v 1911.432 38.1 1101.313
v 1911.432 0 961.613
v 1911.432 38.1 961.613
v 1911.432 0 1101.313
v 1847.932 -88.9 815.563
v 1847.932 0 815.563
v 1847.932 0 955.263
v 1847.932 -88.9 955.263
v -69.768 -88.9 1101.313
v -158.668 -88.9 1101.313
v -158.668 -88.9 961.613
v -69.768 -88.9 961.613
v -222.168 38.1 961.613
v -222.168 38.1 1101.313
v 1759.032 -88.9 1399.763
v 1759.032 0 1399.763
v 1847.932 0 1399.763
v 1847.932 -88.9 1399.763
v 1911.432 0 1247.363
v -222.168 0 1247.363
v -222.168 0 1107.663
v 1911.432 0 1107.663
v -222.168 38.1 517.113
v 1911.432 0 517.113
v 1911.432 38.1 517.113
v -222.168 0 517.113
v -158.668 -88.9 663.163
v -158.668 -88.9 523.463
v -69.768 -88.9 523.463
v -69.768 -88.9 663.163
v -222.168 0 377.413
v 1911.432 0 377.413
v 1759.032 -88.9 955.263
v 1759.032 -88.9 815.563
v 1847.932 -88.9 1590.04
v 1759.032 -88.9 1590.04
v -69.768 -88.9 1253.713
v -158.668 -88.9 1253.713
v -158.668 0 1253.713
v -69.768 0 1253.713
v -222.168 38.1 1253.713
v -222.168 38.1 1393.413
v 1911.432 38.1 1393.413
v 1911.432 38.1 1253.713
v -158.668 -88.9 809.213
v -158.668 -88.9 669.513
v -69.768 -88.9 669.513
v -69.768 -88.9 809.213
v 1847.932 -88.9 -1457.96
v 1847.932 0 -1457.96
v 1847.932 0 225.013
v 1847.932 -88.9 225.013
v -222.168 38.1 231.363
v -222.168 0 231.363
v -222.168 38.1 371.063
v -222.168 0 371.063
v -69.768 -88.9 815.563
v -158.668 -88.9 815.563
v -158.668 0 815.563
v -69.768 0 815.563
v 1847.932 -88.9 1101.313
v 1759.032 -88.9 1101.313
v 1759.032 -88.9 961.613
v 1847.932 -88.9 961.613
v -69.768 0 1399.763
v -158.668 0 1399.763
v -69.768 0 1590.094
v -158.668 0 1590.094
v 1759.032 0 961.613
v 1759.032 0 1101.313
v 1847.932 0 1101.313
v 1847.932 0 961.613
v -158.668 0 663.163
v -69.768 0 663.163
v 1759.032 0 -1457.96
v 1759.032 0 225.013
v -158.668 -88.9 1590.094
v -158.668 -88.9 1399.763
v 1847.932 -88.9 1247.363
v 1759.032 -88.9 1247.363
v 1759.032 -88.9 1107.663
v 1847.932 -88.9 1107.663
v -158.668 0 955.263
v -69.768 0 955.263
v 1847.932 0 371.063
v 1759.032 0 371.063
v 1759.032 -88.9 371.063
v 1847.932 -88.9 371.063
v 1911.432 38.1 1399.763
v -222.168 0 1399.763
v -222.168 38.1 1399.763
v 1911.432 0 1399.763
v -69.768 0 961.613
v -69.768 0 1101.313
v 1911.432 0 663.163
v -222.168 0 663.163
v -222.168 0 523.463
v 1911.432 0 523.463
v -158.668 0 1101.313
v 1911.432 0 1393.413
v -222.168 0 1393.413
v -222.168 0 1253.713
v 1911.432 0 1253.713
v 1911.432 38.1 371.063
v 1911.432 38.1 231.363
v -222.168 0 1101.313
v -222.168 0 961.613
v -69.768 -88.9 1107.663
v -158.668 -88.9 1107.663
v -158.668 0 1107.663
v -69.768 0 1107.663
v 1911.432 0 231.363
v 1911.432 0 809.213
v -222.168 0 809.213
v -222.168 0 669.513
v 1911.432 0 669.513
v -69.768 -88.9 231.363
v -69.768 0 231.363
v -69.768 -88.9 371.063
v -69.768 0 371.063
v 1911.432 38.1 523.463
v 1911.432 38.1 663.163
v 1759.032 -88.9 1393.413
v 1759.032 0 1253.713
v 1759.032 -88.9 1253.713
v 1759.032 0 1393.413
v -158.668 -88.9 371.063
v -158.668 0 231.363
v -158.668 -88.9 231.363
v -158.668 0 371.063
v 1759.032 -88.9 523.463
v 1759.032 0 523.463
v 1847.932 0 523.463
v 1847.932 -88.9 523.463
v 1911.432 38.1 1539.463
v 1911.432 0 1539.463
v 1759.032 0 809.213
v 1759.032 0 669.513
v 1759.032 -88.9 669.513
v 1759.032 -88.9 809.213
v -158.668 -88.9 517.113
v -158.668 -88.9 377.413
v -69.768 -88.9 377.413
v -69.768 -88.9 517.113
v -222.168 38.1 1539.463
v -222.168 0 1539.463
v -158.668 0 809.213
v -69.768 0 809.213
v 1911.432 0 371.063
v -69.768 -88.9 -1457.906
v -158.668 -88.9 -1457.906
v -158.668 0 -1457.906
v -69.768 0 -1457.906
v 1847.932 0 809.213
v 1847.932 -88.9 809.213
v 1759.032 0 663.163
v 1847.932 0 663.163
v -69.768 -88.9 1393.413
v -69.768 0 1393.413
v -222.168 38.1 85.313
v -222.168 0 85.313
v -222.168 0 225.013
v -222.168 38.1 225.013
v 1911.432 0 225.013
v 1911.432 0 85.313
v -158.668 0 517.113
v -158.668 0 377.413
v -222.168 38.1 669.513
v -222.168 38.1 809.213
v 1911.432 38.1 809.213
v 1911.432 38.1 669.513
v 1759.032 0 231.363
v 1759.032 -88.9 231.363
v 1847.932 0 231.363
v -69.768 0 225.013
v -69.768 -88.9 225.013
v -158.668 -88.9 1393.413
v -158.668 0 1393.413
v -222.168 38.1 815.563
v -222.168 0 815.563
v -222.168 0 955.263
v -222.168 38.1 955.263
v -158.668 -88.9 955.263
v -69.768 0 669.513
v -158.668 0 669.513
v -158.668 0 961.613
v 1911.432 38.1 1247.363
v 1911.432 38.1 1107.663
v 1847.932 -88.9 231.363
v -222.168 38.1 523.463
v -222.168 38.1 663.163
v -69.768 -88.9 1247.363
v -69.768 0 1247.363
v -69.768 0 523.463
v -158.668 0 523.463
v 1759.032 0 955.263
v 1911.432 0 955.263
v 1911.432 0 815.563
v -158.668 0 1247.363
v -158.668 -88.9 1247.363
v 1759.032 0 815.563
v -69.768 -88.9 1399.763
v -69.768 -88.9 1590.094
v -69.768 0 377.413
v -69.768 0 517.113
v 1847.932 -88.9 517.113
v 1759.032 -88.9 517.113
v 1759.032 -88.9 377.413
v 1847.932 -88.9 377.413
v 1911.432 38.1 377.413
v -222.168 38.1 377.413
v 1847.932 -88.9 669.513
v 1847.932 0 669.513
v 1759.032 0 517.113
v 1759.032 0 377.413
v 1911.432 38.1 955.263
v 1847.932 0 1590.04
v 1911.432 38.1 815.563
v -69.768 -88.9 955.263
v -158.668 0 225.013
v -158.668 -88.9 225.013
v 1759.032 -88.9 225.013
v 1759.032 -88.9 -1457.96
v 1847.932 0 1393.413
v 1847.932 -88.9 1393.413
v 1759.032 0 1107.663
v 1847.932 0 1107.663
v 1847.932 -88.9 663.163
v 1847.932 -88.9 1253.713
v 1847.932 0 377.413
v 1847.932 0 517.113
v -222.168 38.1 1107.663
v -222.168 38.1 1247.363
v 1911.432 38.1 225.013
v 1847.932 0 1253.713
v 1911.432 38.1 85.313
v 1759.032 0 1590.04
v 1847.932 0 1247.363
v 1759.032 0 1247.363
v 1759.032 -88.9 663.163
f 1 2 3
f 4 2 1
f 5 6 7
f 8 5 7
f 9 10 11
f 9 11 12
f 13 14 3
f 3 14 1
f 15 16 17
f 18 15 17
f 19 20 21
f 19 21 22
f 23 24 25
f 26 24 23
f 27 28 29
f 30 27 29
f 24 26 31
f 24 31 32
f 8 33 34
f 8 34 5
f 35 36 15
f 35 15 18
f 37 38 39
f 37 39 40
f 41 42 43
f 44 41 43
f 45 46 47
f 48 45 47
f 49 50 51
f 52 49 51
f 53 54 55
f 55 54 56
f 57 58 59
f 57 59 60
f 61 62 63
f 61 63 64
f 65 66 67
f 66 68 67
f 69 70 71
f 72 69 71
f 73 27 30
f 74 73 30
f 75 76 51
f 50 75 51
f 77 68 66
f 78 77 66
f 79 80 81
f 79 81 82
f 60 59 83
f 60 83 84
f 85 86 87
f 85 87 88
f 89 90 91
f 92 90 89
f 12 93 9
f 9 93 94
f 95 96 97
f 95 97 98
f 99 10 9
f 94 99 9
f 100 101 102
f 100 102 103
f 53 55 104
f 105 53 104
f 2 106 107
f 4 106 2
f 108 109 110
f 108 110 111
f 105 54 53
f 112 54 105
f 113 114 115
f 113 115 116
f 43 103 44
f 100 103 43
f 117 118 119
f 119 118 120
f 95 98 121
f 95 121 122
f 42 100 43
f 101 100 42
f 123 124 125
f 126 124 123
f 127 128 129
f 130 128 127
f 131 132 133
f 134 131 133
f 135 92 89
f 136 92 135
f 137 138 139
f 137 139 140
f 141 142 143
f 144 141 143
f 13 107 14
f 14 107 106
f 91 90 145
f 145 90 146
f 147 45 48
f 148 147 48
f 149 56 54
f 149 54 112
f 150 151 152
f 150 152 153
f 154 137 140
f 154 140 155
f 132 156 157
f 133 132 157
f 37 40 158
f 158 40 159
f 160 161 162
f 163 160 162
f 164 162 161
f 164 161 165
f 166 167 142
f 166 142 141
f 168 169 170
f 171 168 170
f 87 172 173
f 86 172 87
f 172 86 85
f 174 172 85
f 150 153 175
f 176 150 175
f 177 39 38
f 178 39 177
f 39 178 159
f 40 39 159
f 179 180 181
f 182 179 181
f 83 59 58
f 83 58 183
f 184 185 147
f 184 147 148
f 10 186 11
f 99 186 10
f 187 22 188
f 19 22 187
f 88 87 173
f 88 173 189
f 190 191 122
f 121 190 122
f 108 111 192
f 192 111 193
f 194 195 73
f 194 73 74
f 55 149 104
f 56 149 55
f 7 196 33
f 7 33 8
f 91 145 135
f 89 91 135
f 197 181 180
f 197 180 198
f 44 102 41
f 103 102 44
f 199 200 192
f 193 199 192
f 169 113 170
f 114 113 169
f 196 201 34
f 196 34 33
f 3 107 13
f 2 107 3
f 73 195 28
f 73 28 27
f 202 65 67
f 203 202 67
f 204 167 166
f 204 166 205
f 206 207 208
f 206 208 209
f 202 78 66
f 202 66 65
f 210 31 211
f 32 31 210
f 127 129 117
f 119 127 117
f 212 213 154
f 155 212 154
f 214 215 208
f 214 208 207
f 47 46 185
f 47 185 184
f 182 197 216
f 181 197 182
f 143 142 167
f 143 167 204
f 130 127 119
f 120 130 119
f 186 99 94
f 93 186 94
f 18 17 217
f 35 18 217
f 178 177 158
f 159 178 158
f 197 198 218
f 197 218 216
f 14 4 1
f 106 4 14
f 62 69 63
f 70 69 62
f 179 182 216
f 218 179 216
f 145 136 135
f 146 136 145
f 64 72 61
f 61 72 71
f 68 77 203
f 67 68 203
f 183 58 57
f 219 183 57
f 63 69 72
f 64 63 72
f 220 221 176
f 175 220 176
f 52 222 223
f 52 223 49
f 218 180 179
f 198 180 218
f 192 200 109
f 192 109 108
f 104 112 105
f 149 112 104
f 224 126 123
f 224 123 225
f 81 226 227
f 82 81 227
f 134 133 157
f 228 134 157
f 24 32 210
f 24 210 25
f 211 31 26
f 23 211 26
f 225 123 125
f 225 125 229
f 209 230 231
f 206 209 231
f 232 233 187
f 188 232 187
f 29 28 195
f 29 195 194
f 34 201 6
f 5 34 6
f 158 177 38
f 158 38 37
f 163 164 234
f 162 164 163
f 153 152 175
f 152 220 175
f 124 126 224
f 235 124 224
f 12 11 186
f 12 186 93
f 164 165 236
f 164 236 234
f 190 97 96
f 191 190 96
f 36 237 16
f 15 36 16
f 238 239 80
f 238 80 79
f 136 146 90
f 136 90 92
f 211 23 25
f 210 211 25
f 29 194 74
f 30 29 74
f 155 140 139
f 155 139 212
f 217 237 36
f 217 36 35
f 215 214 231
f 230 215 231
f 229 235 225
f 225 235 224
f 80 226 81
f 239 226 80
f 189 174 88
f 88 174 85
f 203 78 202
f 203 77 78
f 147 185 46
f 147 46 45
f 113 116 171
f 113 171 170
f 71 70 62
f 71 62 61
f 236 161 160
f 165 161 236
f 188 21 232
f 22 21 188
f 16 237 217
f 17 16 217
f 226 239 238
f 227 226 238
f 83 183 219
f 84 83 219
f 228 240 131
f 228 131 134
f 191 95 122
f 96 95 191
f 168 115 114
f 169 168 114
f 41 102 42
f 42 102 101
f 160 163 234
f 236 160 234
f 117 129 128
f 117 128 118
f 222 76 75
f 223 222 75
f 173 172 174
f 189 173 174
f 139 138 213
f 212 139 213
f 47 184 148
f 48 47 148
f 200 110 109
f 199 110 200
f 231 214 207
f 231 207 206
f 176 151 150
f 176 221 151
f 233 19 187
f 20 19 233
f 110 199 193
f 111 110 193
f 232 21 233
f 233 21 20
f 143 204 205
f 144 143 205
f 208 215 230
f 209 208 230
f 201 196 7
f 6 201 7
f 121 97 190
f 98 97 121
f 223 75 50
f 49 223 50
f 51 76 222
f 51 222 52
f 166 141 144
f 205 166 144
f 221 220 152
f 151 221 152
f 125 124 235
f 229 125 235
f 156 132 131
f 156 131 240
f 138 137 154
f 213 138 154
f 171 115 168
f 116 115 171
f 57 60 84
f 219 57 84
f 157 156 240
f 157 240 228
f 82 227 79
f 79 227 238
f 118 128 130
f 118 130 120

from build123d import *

# Parameters (mm, degrees)
F0_W     = 88.9
F0_H     = 914.4
F0_H_2   = 628.8184409082
F0_H_3   = 139.7
F1_DEPTH = 88.9
F0_H_4   = 50.6315590918
F0_H_5   = 50.5771776319
F0_H_6   = 914.45438146
F0_W_2   = 63.5
F0_W_3   = 1828.8
F2_DEPTH = 38.1


with BuildPart() as f1:
    # F0 (on Front) → F1 (new body)
    with BuildSketch(Plane.XZ):
        with Locations((-114.2183623821, -1000.705572027)):
            Rectangle(F0_W, F0_H)
        with Locations((-114.2183623821, -229.0963515729)):
            Rectangle(F0_W, F0_H_2)
        with Locations((-114.2183623821, 155.1628688812)):
            Rectangle(F0_W, F0_H_3)
    extrude(amount=F1_DEPTH)


with BuildPart() as f1b:
    # F0 (on Front) → F1, piece 2 (new body)
    with BuildSketch(Plane.XZ):
        with Locations((-114.2183623821, 301.2128688812)):
            Rectangle(F0_W, F0_H_3)
    extrude(amount=F1_DEPTH)


with BuildPart() as f1c:
    # F0 (on Front) → F1, piece 3 (new body)
    with BuildSketch(Plane.XZ):
        with Locations((-114.2183623821, 447.2628688812)):
            Rectangle(F0_W, F0_H_3)
    extrude(amount=F1_DEPTH)


with BuildPart() as f1d:
    # F0 (on Front) → F1, piece 4 (new body)
    with BuildSketch(Plane.XZ):
        with Locations((-114.2183623821, 593.3128688812)):
            Rectangle(F0_W, F0_H_3)
    extrude(amount=F1_DEPTH)


with BuildPart() as f1e:
    # F0 (on Front) → F1, piece 5 (new body)
    with BuildSketch(Plane.XZ):
        with Locations((-114.2183623821, 739.3628688812)):
            Rectangle(F0_W, F0_H_3)
    extrude(amount=F1_DEPTH)


with BuildPart() as f1f:
    # F0 (on Front) → F1, piece 6 (new body)
    with BuildSketch(Plane.XZ):
        with Locations((-114.2183623821, 885.4128688812)):
            Rectangle(F0_W, F0_H_3)
    extrude(amount=F1_DEPTH)


with BuildPart() as f1g:
    # F0 (on Front) → F1, piece 7 (new body)
    with BuildSketch(Plane.XZ):
        with Locations((-114.2183623821, 1031.4628688812)):
            Rectangle(F0_W, F0_H_3)
    extrude(amount=F1_DEPTH)


with BuildPart() as f1h:
    # F0 (on Front) → F1, piece 8 (new body)
    with BuildSketch(Plane.XZ):
        with Locations((-114.2183623821, 1177.5128688812)):
            Rectangle(F0_W, F0_H_3)
    extrude(amount=F1_DEPTH)


with BuildPart() as f1i:
    # F0 (on Front) → F1, piece 9 (new body)
    with BuildSketch(Plane.XZ):
        with Locations((-114.2183623821, 1323.5628688812)):
            Rectangle(F0_W, F0_H_3)
    extrude(amount=F1_DEPTH)


with BuildPart() as f1j:
    # F0 (on Front) → F1, piece 10 (new body)
    with BuildSketch(Plane.XZ):
        with Locations((-114.2183623821, 1469.6128688812)):
            Rectangle(F0_W, F0_H_3)
        with Locations((-114.2183623821, 1564.7786484271)):
            Rectangle(F0_W, F0_H_4)
    extrude(amount=F1_DEPTH)


with BuildPart() as f1k:
    # F0 (on Front) → F1, piece 11 (new body)
    with BuildSketch(Plane.XZ):
        with Locations((1803.4816376179, 1564.7514576972)):
            Rectangle(F0_W, F0_H_5)
        with Locations((1803.4816376179, 1469.6128688812)):
            Rectangle(F0_W, F0_H_3)
    extrude(amount=F1_DEPTH)


with BuildPart() as f1l:
    # F0 (on Front) → F1, piece 12 (new body)
    with BuildSketch(Plane.XZ):
        with Locations((1803.4816376179, 1323.5628688812)):
            Rectangle(F0_W, F0_H_3)
    extrude(amount=F1_DEPTH)


with BuildPart() as f1m:
    # F0 (on Front) → F1, piece 13 (new body)
    with BuildSketch(Plane.XZ):
        with Locations((1803.4816376179, 1177.5128688812)):
            Rectangle(F0_W, F0_H_3)
    extrude(amount=F1_DEPTH)


with BuildPart() as f1n:
    # F0 (on Front) → F1, piece 14 (new body)
    with BuildSketch(Plane.XZ):
        with Locations((1803.4816376179, 1031.4628688812)):
            Rectangle(F0_W, F0_H_3)
    extrude(amount=F1_DEPTH)


with BuildPart() as f1o:
    # F0 (on Front) → F1, piece 15 (new body)
    with BuildSketch(Plane.XZ):
        with Locations((1803.4816376179, 885.4128688812)):
            Rectangle(F0_W, F0_H_3)
    extrude(amount=F1_DEPTH)


with BuildPart() as f1p:
    # F0 (on Front) → F1, piece 16 (new body)
    with BuildSketch(Plane.XZ):
        with Locations((1803.4816376179, 739.3628688812)):
            Rectangle(F0_W, F0_H_3)
    extrude(amount=F1_DEPTH)


with BuildPart() as f1q:
    # F0 (on Front) → F1, piece 17 (new body)
    with BuildSketch(Plane.XZ):
        with Locations((1803.4816376179, 593.3128688812)):
            Rectangle(F0_W, F0_H_3)
    extrude(amount=F1_DEPTH)


with BuildPart() as f1r:
    # F0 (on Front) → F1, piece 18 (new body)
    with BuildSketch(Plane.XZ):
        with Locations((1803.4816376179, 447.2628688812)):
            Rectangle(F0_W, F0_H_3)
    extrude(amount=F1_DEPTH)


with BuildPart() as f1s:
    # F0 (on Front) → F1, piece 19 (new body)
    with BuildSketch(Plane.XZ):
        with Locations((1803.4816376179, 301.2128688812)):
            Rectangle(F0_W, F0_H_3)
    extrude(amount=F1_DEPTH)


with BuildPart() as f1t:
    # F0 (on Front) → F1, piece 20 (new body)
    with BuildSketch(Plane.XZ):
        with Locations((1803.4816376179, 155.1628688812)):
            Rectangle(F0_W, F0_H_3)
        with Locations((1803.4816376179, -229.0963515729)):
            Rectangle(F0_W, F0_H_2)
        with Locations((1803.4816376179, -1000.7327627569)):
            Rectangle(F0_W, F0_H_6)
    extrude(amount=F1_DEPTH)


with BuildPart() as f2:
    # F0 (on Front) → F2 (new body)
    with BuildSketch(Plane.XZ):
        with Locations((-190.4183623821, 1469.6128688812)):
            Rectangle(F0_W_2, F0_H_3)
        with Locations((844.6316376179, 1469.6128688812)):
            Rectangle(F0_W_3, F0_H_3)
        with Locations((-114.2183623821, 1469.6128688812)):
            Rectangle(F0_W, F0_H_3)
        with Locations((1803.4816376179, 1469.6128688812)):
            Rectangle(F0_W, F0_H_3)
        with Locations((1879.6816376179, 1469.6128688812)):
            Rectangle(F0_W_2, F0_H_3)
    extrude(amount=-F2_DEPTH)


with BuildPart() as f2b:
    # F0 (on Front) → F2, piece 2 (new body)
    with BuildSketch(Plane.XZ):
        with Locations((-190.4183623821, 1323.5628688812)):
            Rectangle(F0_W_2, F0_H_3)
        with Locations((-114.2183623821, 1323.5628688812)):
            Rectangle(F0_W, F0_H_3)
        with Locations((844.6316376179, 1323.5628688812)):
            Rectangle(F0_W_3, F0_H_3)
        with Locations((1803.4816376179, 1323.5628688812)):
            Rectangle(F0_W, F0_H_3)
        with Locations((1879.6816376179, 1323.5628688812)):
            Rectangle(F0_W_2, F0_H_3)
    extrude(amount=-F2_DEPTH)


with BuildPart() as f2c:
    # F0 (on Front) → F2, piece 3 (new body)
    with BuildSketch(Plane.XZ):
        with Locations((-190.4183623821, 1177.5128688812)):
            Rectangle(F0_W_2, F0_H_3)
        with Locations((-114.2183623821, 1177.5128688812)):
            Rectangle(F0_W, F0_H_3)
        with Locations((844.6316376179, 1177.5128688812)):
            Rectangle(F0_W_3, F0_H_3)
        with Locations((1803.4816376179, 1177.5128688812)):
            Rectangle(F0_W, F0_H_3)
        with Locations((1879.6816376179, 1177.5128688812)):
            Rectangle(F0_W_2, F0_H_3)
    extrude(amount=-F2_DEPTH)


with BuildPart() as f2d:
    # F0 (on Front) → F2, piece 4 (new body)
    with BuildSketch(Plane.XZ):
        with Locations((-190.4183623821, 1031.4628688812)):
            Rectangle(F0_W_2, F0_H_3)
        with Locations((-114.2183623821, 1031.4628688812)):
            Rectangle(F0_W, F0_H_3)
        with Locations((844.6316376179, 1031.4628688812)):
            Rectangle(F0_W_3, F0_H_3)
        with Locations((1803.4816376179, 1031.4628688812)):
            Rectangle(F0_W, F0_H_3)
        with Locations((1879.6816376179, 1031.4628688812)):
            Rectangle(F0_W_2, F0_H_3)
    extrude(amount=-F2_DEPTH)


with BuildPart() as f2e:
    # F0 (on Front) → F2, piece 5 (new body)
    with BuildSketch(Plane.XZ):
        with Locations((-190.4183623821, 885.4128688812)):
            Rectangle(F0_W_2, F0_H_3)
        with Locations((-114.2183623821, 885.4128688812)):
            Rectangle(F0_W, F0_H_3)
        with Locations((844.6316376179, 885.4128688812)):
            Rectangle(F0_W_3, F0_H_3)
        with Locations((1803.4816376179, 885.4128688812)):
            Rectangle(F0_W, F0_H_3)
        with Locations((1879.6816376179, 885.4128688812)):
            Rectangle(F0_W_2, F0_H_3)
    extrude(amount=-F2_DEPTH)


with BuildPart() as f2f:
    # F0 (on Front) → F2, piece 6 (new body)
    with BuildSketch(Plane.XZ):
        with Locations((-190.4183623821, 739.3628688812)):
            Rectangle(F0_W_2, F0_H_3)
        with Locations((-114.2183623821, 739.3628688812)):
            Rectangle(F0_W, F0_H_3)
        with Locations((844.6316376179, 739.3628688812)):
            Rectangle(F0_W_3, F0_H_3)
        with Locations((1803.4816376179, 739.3628688812)):
            Rectangle(F0_W, F0_H_3)
        with Locations((1879.6816376179, 739.3628688812)):
            Rectangle(F0_W_2, F0_H_3)
    extrude(amount=-F2_DEPTH)


with BuildPart() as f2g:
    # F0 (on Front) → F2, piece 7 (new body)
    with BuildSketch(Plane.XZ):
        with Locations((-190.4183623821, 593.3128688812)):
            Rectangle(F0_W_2, F0_H_3)
        with Locations((844.6316376179, 593.3128688812)):
            Rectangle(F0_W_3, F0_H_3)
        with Locations((-114.2183623821, 593.3128688812)):
            Rectangle(F0_W, F0_H_3)
        with Locations((1803.4816376179, 593.3128688812)):
            Rectangle(F0_W, F0_H_3)
        with Locations((1879.6816376179, 593.3128688812)):
            Rectangle(F0_W_2, F0_H_3)
    extrude(amount=-F2_DEPTH)


with BuildPart() as f2h:
    # F0 (on Front) → F2, piece 8 (new body)
    with BuildSketch(Plane.XZ):
        with Locations((-190.4183623821, 447.2628688812)):
            Rectangle(F0_W_2, F0_H_3)
        with Locations((-114.2183623821, 447.2628688812)):
            Rectangle(F0_W, F0_H_3)
        with Locations((844.6316376179, 447.2628688812)):
            Rectangle(F0_W_3, F0_H_3)
        with Locations((1803.4816376179, 447.2628688812)):
            Rectangle(F0_W, F0_H_3)
        with Locations((1879.6816376179, 447.2628688812)):
            Rectangle(F0_W_2, F0_H_3)
    extrude(amount=-F2_DEPTH)


with BuildPart() as f2i:
    # F0 (on Front) → F2, piece 9 (new body)
    with BuildSketch(Plane.XZ):
        with Locations((-190.4183623821, 301.2128688812)):
            Rectangle(F0_W_2, F0_H_3)
        with Locations((-114.2183623821, 301.2128688812)):
            Rectangle(F0_W, F0_H_3)
        with Locations((844.6316376179, 301.2128688812)):
            Rectangle(F0_W_3, F0_H_3)
        with Locations((1803.4816376179, 301.2128688812)):
            Rectangle(F0_W, F0_H_3)
        with Locations((1879.6816376179, 301.2128688812)):
            Rectangle(F0_W_2, F0_H_3)
    extrude(amount=-F2_DEPTH)


with BuildPart() as f2j:
    # F0 (on Front) → F2, piece 10 (new body)
    with BuildSketch(Plane.XZ):
        with Locations((-190.4183623821, 155.1628688812)):
            Rectangle(F0_W_2, F0_H_3)
        with Locations((-114.2183623821, 155.1628688812)):
            Rectangle(F0_W, F0_H_3)
        with Locations((844.6316376179, 155.1628688812)):
            Rectangle(F0_W_3, F0_H_3)
        with Locations((1803.4816376179, 155.1628688812)):
            Rectangle(F0_W, F0_H_3)
        with Locations((1879.6816376179, 155.1628688812)):
            Rectangle(F0_W_2, F0_H_3)
    extrude(amount=-F2_DEPTH)


solid = Compound([f1.part, f1b.part, f1c.part, f1d.part, f1e.part, f1f.part, f1g.part, f1h.part, f1i.part, f1j.part, f1k.part, f1l.part, f1m.part, f1n.part, f1o.part, f1p.part, f1q.part, f1r.part, f1s.part, f1t.part, f2.part, f2b.part, f2c.part, f2d.part, f2e.part, f2f.part, f2g.part, f2h.part, f2i.part, f2j.part])
